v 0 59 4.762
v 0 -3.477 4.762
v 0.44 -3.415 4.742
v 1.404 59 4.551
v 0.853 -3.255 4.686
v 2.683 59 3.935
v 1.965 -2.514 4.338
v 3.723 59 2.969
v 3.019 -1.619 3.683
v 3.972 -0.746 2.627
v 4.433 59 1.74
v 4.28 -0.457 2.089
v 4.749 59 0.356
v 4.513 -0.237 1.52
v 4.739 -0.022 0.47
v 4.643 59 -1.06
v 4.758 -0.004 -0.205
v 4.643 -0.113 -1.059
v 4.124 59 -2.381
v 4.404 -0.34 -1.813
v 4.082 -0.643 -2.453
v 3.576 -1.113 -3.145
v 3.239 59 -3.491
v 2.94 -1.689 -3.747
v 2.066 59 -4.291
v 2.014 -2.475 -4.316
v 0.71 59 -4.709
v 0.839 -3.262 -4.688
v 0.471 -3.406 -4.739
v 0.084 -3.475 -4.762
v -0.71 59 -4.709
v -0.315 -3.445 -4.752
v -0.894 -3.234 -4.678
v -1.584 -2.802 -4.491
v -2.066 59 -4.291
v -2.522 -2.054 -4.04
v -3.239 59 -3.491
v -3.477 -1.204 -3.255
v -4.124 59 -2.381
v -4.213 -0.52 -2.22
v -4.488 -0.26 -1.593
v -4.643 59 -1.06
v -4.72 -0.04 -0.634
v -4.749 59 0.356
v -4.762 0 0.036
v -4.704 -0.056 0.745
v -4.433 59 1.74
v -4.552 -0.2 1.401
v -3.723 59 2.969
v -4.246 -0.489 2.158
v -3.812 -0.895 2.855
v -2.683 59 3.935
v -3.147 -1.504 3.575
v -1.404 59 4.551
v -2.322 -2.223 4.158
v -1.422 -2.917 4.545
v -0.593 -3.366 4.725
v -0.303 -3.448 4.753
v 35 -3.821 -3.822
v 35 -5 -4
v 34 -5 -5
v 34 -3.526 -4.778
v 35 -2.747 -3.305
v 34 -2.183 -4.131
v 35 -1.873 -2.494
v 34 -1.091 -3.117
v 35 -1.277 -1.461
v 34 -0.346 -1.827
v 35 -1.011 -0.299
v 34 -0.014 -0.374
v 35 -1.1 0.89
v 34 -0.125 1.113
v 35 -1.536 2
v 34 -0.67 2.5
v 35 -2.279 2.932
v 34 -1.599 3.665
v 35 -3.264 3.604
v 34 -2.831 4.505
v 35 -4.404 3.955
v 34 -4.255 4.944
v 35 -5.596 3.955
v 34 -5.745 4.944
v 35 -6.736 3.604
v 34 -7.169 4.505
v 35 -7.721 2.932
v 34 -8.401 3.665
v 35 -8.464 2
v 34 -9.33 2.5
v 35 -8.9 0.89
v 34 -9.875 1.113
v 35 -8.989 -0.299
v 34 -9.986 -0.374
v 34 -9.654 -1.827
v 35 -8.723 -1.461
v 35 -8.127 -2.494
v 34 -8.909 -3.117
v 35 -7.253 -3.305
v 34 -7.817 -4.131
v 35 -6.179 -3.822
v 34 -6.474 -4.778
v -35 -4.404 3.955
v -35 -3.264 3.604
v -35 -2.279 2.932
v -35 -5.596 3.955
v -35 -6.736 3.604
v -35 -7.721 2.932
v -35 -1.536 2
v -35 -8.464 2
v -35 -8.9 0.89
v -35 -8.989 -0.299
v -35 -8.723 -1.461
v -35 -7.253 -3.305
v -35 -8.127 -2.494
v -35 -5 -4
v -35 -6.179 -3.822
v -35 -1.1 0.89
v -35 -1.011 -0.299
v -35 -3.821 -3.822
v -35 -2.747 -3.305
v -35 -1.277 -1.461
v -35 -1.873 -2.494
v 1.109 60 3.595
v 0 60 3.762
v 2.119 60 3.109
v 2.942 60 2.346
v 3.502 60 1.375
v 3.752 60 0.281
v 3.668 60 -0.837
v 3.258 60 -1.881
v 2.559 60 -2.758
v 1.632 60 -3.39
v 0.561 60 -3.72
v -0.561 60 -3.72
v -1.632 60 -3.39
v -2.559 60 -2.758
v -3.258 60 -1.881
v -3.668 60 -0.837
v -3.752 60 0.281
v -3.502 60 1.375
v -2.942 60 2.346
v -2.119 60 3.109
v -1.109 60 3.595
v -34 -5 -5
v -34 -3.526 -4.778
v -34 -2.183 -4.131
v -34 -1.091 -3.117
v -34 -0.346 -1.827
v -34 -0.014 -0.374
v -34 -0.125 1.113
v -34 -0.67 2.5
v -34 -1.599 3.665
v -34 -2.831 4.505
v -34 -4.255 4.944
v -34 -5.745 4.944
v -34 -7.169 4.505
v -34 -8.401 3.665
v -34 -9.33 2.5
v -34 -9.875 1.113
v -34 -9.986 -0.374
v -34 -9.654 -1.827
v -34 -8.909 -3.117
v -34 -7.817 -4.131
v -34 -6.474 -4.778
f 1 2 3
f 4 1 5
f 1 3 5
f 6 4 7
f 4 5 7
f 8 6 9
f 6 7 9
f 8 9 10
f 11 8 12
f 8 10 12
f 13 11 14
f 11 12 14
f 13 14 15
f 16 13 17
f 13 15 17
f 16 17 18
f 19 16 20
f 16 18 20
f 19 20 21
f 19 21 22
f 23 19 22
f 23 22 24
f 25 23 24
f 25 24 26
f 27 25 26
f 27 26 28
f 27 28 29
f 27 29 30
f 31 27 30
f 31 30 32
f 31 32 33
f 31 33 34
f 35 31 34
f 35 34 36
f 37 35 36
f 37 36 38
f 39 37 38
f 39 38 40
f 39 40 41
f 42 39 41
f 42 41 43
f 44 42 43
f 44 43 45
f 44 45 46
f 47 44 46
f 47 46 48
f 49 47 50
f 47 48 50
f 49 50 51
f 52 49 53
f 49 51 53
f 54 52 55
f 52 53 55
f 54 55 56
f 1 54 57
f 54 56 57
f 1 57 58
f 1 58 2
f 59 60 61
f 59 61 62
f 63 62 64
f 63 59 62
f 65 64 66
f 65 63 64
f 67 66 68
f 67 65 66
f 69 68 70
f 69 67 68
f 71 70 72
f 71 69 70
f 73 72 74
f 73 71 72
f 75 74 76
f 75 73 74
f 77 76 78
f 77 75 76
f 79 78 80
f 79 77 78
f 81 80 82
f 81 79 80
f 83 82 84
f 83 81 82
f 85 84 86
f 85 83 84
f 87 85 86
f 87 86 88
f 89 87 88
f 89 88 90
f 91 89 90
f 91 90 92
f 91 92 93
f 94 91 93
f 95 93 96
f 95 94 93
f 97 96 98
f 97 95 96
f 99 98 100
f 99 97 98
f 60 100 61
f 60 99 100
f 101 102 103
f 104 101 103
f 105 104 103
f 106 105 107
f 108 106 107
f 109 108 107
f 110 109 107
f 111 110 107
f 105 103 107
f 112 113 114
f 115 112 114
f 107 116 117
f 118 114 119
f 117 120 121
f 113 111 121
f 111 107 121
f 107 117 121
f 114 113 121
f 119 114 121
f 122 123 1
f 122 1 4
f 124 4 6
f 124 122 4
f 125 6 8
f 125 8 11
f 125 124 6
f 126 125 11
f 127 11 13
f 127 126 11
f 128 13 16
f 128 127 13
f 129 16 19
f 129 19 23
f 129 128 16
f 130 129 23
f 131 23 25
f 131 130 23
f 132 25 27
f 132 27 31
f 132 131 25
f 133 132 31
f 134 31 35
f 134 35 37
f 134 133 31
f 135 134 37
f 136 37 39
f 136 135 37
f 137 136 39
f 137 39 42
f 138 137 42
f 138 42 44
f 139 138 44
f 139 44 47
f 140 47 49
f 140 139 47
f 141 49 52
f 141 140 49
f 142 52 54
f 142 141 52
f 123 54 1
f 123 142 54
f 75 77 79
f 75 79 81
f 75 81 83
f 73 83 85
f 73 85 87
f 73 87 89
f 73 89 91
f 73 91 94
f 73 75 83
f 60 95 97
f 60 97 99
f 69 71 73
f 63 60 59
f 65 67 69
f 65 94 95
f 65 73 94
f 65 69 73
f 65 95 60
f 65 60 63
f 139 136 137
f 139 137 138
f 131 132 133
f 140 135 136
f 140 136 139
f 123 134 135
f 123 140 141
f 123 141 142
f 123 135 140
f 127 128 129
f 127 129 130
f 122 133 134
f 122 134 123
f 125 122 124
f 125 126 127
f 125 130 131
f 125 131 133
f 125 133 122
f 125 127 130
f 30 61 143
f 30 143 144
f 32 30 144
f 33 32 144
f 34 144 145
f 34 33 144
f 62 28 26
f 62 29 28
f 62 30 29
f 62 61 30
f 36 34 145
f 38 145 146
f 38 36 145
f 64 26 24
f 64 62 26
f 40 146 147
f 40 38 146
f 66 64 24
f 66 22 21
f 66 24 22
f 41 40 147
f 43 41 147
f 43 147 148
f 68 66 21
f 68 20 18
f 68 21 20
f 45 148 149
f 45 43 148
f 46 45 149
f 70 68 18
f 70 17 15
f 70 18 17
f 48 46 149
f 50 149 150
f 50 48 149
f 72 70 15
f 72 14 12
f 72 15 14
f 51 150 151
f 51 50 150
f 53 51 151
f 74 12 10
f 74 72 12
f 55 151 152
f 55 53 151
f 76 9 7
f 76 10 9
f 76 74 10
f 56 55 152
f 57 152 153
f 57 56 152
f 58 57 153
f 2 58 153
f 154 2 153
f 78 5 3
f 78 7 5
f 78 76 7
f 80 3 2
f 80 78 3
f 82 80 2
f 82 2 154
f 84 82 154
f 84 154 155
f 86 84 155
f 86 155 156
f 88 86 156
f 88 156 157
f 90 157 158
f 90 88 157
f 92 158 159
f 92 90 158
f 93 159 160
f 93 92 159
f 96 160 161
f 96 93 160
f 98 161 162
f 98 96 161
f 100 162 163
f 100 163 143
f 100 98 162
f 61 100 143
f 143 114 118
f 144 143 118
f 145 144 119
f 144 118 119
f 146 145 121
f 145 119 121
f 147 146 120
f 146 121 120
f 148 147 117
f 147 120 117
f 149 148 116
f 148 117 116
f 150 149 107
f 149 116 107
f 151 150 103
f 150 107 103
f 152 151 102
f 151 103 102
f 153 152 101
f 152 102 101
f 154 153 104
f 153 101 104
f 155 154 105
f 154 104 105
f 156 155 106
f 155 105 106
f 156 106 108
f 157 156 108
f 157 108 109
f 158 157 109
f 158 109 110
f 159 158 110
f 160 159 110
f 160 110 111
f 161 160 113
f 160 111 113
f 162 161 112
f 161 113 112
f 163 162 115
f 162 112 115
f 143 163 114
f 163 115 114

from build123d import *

# Parameters (mm, degrees)
SKETCH1_R                = 5
BOSS_EXTRUDE1_DEPTH      = 35
BOSS_EXTRUDE5_DEPTH      = 60
BOSS_EXTRUDE5_DEPTH_BACK = 5
SKETCH2_R                = 4.7625
CHAMFER1_SIZE            = 1


with BuildPart() as part:
    # Sketch1 → Boss-Extrude1 (new, symmetric)
    with BuildSketch(Plane(origin=(0, 0, 0), x_dir=(0, 0, -1), z_dir=(1, 0, 0))):
        with Locations((0, -5)):
            Circle(SKETCH1_R)
    extrude(amount=BOSS_EXTRUDE1_DEPTH, both=True)

    # Sketch2 → Boss-Extrude5 (add, two sides: drawn at the far end of the back side and taken through both)
    with BuildSketch(Plane(origin=(0, 0, 0), x_dir=(1, 0, 0), z_dir=(0, 1, 0)).offset(-BOSS_EXTRUDE5_DEPTH_BACK)):
        with Locations(Location((0, 0, 0), (0, 0, 270))):
            Circle(SKETCH2_R)
    extrude(amount=BOSS_EXTRUDE5_DEPTH + BOSS_EXTRUDE5_DEPTH_BACK)

    # Chamfer1
    chamfer1_edges = [part.edges().sort_by_distance(p)[0] for p in [
        (-35, -5, 5),
        (35, -5, 5),
        (0, 60, -4.7625),
    ]]
    chamfer(chamfer1_edges, length=CHAMFER1_SIZE)


solid = part.part
